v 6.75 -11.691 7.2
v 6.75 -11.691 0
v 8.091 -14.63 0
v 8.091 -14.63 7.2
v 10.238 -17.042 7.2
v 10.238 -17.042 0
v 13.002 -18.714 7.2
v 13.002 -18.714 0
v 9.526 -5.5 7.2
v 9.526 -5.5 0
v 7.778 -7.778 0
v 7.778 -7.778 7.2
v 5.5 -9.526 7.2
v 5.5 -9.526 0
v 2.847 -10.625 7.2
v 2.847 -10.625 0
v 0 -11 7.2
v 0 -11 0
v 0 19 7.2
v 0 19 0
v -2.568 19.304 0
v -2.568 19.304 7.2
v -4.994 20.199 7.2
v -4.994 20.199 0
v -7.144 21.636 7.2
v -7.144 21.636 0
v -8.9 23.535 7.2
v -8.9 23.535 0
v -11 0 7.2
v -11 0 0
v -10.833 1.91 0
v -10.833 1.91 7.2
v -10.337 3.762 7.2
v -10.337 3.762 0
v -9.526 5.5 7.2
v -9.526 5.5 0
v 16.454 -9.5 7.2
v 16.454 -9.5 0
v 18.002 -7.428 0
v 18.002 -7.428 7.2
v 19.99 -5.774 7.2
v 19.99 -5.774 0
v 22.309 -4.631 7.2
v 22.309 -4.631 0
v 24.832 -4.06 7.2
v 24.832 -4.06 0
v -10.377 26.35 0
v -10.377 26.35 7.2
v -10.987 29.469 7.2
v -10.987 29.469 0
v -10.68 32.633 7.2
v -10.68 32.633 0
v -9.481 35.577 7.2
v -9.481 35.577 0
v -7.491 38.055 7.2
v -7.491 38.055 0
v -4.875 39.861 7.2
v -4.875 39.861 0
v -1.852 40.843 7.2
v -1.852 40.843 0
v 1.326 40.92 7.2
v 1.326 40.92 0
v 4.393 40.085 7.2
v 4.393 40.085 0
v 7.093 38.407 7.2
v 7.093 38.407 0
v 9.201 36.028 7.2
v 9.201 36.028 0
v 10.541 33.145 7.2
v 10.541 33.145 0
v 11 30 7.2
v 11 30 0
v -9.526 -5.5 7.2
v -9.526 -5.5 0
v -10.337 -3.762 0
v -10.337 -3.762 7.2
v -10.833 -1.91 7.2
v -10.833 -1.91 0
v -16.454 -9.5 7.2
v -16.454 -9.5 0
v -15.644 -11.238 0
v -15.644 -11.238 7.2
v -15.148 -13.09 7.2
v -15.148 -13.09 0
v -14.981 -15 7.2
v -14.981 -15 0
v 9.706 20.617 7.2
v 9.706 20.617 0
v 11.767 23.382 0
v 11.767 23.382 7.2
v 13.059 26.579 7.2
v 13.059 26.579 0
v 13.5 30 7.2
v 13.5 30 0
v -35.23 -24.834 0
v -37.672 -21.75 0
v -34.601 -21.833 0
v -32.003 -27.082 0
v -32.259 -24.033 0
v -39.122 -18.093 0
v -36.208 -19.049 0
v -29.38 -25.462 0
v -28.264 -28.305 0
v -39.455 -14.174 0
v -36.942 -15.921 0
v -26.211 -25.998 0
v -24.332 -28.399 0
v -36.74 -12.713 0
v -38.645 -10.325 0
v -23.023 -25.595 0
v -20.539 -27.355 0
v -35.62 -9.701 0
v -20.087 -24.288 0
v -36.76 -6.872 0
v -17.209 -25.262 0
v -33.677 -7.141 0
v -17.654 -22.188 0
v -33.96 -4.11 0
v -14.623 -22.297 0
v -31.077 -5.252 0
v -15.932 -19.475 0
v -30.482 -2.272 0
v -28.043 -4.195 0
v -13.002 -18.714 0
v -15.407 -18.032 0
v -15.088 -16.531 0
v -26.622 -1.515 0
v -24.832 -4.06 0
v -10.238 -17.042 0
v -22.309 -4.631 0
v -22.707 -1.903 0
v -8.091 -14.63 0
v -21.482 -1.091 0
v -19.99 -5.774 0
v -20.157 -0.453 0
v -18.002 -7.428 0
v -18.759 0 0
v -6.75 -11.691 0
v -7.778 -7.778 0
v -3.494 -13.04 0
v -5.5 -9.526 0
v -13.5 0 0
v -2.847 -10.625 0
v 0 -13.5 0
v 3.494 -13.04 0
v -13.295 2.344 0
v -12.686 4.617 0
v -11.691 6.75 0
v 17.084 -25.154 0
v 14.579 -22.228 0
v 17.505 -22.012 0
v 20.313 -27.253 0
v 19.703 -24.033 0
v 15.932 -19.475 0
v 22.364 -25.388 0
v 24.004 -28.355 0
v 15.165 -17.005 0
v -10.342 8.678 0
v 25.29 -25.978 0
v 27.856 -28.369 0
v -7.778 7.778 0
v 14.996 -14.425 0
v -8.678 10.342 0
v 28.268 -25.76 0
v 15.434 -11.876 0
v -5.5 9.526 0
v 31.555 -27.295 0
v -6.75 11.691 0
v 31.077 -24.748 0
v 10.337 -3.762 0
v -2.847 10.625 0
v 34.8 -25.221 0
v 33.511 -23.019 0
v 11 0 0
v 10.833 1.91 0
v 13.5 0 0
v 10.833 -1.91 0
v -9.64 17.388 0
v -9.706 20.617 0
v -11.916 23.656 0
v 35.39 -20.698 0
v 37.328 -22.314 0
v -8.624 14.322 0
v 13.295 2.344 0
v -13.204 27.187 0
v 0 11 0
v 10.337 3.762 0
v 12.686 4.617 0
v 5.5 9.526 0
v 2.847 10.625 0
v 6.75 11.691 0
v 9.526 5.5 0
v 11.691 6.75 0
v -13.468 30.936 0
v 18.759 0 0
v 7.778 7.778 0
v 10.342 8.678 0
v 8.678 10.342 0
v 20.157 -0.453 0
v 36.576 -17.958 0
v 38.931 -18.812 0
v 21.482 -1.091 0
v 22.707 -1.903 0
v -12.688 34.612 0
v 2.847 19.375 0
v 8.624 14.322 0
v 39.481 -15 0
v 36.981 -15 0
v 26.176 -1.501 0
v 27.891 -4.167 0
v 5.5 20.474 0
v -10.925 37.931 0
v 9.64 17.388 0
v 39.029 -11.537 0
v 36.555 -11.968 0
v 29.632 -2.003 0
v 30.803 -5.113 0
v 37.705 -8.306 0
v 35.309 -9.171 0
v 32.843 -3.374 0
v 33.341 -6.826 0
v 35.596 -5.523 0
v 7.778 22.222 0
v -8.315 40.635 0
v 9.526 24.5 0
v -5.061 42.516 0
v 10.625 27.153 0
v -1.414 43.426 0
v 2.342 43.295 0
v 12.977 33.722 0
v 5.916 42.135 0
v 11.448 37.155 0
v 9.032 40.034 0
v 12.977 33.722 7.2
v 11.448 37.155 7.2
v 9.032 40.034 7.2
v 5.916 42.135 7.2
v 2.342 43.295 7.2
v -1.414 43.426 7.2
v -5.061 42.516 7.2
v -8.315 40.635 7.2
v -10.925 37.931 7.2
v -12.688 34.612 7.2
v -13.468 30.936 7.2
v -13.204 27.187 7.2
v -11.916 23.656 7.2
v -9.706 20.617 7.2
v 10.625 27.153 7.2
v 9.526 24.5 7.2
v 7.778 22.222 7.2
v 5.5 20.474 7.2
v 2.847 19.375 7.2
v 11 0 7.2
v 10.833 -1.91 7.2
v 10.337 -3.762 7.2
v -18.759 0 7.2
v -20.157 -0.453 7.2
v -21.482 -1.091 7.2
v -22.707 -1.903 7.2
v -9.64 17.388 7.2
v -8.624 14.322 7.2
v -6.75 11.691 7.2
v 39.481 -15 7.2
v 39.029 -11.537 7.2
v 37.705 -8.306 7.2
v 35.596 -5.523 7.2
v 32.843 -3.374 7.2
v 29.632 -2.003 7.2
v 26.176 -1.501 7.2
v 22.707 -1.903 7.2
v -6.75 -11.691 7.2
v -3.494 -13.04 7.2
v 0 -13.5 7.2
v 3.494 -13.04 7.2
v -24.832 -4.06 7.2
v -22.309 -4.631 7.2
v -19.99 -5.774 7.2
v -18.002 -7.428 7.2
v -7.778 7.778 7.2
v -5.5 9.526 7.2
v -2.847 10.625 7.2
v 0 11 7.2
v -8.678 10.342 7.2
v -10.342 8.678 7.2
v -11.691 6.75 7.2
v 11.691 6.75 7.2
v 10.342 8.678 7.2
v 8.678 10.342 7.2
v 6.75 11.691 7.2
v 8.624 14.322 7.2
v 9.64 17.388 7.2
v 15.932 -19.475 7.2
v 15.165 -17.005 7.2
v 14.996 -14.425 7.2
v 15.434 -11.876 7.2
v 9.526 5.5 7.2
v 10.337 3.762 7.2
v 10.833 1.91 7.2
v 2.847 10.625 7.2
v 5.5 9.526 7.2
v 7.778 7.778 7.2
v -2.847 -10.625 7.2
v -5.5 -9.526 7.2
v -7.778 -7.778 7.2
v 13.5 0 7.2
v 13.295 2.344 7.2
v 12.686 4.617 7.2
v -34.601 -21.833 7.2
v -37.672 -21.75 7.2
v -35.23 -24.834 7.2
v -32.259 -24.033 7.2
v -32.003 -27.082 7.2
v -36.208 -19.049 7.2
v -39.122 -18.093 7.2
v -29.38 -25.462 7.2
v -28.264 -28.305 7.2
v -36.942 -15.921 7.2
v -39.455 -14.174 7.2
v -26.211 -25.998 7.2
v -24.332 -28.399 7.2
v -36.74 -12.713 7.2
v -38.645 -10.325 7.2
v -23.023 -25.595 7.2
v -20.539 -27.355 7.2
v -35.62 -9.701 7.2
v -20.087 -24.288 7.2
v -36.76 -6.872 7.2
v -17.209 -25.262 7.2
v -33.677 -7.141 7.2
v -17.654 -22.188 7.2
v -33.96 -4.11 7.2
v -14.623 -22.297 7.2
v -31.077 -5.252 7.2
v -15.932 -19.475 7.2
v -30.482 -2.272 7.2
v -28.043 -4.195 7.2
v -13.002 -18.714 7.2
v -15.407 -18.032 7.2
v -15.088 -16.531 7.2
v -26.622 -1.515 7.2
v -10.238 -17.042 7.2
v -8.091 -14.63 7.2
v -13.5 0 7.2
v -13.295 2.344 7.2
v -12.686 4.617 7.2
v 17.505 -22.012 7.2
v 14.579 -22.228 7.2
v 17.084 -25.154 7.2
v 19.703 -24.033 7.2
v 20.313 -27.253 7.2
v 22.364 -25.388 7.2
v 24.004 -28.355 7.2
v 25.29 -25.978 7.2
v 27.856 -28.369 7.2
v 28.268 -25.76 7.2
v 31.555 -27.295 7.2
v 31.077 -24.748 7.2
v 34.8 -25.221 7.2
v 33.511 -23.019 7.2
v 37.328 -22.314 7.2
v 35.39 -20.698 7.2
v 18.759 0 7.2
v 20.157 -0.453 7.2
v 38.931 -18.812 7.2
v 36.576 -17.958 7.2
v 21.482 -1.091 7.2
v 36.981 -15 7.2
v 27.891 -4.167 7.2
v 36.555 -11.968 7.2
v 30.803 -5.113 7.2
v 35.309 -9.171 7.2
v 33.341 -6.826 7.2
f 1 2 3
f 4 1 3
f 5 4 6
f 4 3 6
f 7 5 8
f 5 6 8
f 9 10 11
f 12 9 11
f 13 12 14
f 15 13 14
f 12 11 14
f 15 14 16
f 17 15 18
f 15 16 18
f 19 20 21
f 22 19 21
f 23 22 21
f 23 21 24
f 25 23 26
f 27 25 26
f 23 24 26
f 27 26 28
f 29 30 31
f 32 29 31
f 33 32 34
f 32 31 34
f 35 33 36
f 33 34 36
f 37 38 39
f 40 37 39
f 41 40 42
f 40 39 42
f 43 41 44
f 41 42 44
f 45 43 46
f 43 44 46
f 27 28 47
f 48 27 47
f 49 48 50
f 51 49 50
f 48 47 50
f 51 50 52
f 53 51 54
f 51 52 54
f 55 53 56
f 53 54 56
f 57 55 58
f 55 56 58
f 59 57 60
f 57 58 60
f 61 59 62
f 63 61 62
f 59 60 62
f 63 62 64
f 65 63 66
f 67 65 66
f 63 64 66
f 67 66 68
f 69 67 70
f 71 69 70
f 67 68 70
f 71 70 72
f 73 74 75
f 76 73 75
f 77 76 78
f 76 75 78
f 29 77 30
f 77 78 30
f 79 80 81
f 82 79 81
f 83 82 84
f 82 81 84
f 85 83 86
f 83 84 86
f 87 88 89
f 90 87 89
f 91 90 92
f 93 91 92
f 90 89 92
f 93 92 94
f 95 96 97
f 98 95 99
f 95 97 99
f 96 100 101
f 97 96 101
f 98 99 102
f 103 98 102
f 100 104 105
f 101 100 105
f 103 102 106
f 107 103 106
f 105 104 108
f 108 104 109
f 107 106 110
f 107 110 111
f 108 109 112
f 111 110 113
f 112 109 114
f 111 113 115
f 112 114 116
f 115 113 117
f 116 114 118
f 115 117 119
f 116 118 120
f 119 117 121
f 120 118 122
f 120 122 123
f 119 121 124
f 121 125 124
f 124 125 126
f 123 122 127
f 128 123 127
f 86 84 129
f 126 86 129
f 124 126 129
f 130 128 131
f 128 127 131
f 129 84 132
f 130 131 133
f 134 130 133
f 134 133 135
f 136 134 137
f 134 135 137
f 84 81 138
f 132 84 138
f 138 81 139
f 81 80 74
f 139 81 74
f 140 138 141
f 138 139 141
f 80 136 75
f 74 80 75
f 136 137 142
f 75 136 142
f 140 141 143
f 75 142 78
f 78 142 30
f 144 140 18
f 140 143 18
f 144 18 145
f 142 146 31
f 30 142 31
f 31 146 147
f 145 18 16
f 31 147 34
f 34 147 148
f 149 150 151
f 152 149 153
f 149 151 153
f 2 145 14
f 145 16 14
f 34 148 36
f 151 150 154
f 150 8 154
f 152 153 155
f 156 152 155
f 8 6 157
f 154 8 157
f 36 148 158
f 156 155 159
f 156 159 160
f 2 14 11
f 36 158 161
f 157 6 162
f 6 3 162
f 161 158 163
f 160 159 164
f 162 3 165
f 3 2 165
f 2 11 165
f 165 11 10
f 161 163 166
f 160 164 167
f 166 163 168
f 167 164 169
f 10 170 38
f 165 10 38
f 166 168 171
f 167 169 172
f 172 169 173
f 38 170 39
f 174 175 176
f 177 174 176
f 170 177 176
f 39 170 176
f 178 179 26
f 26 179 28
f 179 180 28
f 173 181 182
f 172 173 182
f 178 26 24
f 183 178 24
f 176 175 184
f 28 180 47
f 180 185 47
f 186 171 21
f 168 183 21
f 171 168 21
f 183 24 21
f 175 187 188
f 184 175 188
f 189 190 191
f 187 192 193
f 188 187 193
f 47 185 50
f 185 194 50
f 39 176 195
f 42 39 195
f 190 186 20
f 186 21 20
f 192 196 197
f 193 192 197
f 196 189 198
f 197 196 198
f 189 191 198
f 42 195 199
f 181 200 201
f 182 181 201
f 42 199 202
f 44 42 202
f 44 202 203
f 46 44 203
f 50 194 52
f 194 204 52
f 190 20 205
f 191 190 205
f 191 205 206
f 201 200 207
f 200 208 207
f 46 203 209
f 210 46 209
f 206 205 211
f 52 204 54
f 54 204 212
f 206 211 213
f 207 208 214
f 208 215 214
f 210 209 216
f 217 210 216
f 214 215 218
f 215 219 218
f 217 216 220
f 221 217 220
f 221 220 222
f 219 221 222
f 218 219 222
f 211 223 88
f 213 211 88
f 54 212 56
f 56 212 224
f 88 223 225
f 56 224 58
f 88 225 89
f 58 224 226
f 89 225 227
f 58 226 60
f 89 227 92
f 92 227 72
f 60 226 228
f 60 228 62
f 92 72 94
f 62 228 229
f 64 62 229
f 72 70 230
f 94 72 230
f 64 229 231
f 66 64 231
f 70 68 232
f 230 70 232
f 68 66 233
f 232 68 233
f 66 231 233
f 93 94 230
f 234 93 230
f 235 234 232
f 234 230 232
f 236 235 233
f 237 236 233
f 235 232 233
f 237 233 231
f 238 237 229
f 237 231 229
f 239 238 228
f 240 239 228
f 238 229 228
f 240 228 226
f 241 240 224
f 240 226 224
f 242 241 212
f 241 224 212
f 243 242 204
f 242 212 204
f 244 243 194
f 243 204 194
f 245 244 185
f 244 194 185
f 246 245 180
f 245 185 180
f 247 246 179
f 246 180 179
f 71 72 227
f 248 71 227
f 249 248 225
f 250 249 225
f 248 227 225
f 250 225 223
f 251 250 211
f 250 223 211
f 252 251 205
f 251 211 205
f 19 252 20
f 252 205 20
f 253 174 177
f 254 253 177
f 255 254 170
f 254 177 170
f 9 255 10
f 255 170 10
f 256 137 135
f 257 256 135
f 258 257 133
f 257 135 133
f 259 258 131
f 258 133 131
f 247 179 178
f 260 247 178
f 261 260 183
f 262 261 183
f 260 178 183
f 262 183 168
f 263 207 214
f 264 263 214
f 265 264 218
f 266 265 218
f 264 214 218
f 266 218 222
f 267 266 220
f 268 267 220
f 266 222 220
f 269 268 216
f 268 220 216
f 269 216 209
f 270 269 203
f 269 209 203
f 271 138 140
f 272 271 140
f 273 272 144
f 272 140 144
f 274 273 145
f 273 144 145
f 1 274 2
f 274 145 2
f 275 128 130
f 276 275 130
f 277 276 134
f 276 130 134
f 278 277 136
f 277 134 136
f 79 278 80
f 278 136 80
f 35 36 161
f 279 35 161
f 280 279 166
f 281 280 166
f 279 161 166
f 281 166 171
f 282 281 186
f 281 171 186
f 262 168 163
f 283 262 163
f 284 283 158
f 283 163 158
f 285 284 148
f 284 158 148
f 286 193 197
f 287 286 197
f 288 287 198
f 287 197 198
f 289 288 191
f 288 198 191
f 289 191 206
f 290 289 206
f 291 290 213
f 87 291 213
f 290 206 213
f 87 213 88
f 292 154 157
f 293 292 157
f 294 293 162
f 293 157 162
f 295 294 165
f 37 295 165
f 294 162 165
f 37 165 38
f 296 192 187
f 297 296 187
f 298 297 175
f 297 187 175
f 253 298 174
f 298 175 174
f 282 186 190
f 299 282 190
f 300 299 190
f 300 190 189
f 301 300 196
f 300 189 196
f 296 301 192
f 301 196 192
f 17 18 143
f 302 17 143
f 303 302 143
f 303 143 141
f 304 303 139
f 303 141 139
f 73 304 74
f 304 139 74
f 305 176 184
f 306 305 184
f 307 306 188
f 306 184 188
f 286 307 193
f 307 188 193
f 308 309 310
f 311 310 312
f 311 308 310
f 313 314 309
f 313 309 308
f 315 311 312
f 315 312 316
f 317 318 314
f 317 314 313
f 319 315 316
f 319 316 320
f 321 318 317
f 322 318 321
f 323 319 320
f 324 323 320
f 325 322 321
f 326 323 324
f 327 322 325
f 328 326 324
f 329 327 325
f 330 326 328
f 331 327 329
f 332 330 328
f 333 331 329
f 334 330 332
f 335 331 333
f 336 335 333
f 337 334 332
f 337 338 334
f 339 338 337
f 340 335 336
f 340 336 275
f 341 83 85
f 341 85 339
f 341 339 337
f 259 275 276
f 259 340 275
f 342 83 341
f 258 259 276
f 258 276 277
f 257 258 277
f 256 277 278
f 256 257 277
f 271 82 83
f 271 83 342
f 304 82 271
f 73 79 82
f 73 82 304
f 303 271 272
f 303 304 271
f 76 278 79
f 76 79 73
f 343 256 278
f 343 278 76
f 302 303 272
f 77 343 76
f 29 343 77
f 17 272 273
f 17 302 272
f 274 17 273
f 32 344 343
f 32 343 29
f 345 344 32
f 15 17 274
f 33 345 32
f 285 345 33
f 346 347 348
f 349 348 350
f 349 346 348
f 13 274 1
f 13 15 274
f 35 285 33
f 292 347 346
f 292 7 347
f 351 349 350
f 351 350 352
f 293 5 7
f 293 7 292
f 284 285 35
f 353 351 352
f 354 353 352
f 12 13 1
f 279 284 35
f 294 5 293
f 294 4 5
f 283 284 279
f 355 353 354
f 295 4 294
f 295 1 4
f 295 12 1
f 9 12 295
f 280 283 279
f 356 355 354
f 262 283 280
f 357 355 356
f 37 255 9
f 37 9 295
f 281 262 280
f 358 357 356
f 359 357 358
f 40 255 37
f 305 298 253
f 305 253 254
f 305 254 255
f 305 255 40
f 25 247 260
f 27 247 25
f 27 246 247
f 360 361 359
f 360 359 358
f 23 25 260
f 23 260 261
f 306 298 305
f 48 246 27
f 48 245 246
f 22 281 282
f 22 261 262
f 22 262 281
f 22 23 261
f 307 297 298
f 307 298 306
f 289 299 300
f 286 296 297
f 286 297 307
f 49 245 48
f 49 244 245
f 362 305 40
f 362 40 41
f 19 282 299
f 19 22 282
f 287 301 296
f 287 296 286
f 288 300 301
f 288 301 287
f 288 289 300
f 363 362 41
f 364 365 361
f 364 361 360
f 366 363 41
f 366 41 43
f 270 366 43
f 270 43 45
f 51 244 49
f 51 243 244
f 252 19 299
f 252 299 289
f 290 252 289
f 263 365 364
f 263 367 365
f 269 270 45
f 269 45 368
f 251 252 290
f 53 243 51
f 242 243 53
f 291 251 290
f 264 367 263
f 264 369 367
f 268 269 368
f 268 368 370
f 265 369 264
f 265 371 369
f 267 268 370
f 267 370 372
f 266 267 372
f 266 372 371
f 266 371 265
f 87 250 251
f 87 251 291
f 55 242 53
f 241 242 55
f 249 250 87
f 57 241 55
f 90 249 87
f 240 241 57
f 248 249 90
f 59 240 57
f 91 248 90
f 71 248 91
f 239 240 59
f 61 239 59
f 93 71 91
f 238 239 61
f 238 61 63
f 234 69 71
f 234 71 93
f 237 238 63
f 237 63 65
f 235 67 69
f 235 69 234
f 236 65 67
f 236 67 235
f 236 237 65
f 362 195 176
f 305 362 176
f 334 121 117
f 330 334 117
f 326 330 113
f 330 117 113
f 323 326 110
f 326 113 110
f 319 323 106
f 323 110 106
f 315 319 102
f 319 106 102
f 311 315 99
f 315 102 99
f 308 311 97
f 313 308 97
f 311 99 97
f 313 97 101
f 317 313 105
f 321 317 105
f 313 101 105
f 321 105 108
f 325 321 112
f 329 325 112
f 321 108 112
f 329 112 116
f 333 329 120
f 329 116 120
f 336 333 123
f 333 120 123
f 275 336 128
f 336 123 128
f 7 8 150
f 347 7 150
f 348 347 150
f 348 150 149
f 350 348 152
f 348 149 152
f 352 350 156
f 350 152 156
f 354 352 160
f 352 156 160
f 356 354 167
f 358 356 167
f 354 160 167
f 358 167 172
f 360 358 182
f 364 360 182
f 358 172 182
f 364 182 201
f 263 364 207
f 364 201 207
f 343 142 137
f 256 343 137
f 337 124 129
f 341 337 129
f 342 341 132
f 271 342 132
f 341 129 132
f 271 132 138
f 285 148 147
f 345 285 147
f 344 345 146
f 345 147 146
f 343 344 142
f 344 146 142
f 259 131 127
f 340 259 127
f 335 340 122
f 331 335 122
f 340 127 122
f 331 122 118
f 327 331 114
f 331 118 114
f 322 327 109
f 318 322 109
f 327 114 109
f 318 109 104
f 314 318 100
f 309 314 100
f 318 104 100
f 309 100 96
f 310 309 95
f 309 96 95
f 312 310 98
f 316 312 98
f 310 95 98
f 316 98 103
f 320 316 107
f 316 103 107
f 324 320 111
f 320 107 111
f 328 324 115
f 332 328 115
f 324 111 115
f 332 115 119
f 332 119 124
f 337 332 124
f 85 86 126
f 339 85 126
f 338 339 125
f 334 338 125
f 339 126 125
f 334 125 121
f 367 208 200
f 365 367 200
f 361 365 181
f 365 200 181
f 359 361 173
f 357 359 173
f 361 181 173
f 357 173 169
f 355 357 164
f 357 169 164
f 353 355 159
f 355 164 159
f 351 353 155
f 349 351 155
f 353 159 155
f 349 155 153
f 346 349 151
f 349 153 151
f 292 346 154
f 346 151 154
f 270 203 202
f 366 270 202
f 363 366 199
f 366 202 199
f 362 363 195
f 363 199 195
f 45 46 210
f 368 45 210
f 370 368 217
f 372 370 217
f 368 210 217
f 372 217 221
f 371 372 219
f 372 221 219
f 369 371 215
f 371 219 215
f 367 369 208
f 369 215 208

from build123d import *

# Parameters (mm, degrees)
F1_DEPTH = 7.2


with BuildPart() as f1:
    # F0 (on Top) → F1 (new body)
    with BuildSketch(Plane.XY):
        with BuildLine():
            ThreePointArc((-22.7073595632, -1.902869179), (-37.6721050646, -21.75), (-13.0016128307, -18.7137156451))
            ThreePointArc((-13.0016128307, -18.7137156451), (-14.4400957969, -19.1971358452), (-15.9320338179, -19.4747133584))
            ThreePointArc((-15.9320338179, -19.4747133584), (-35.5070415552, -20.5), (-24.8316134088, -4.060189341))
            ThreePointArc((-24.8316134088, -4.060189341), (-23.8452552203, -2.9069218706), (-22.7073595632, -1.902869179))
        make_face()
        with BuildLine():
            ThreePointArc((-6.75, -11.6913429511), (-9.545941546, -9.545941546), (-11.6913429511, -6.75))
            Line((-11.6913429511, -6.75), (-14.2894191624, -8.25))
            ThreePointArc((-14.2894191624, -8.25), (-12.9407634586, -11.5059428911), (-12.4807621135, -15))
            ThreePointArc((-12.4807621135, -15), (-12.6116088995, -16.8750312906), (-13.0016128307, -18.7137156451))
            ThreePointArc((-13.0016128307, -18.7137156451), (-9.0739087263, -15.9164124969), (-6.75, -11.6913429511))
        make_face()
        with BuildLine():
            Line((-14.2894191624, -8.25), (-11.6913429511, -6.75))
            ThreePointArc((-11.6913429511, -6.75), (-13.0399986549, -3.4940571089), (-13.5, 0))
            Line((-13.5, 0), (-18.7587036207, 0))
            ThreePointArc((-18.7587036207, 0), (-20.8303192969, -0.7495522538), (-22.7073595632, -1.902869179))
            ThreePointArc((-22.7073595632, -1.902869179), (-17.8531905577, -4.2207337632), (-14.2894191624, -8.25))
        make_face()
        with BuildLine():
            Line((-16.4544826719, -9.5), (-14.2894191624, -8.25))
            ThreePointArc((-14.2894191624, -8.25), (-17.8531905577, -4.2207337632), (-22.7073595632, -1.902869179))
            ThreePointArc((-22.7073595632, -1.902869179), (-23.8452552203, -2.9069218706), (-24.8316134088, -4.060189341))
            ThreePointArc((-24.8316134088, -4.060189341), (-19.9900128675, -5.7744418342), (-16.4544826719, -9.5))
        make_face()
        with BuildLine():
            ThreePointArc((-12.4807621135, -15), (-12.9407634586, -11.5059428911), (-14.2894191624, -8.25))
            Line((-14.2894191624, -8.25), (-16.4544826719, -9.5))
            ThreePointArc((-16.4544826719, -9.5), (-15.3555780244, -12.1529905039), (-14.9807621135, -15))
            ThreePointArc((-14.9807621135, -15), (-15.221207958, -17.2873553231), (-15.9320338179, -19.4747133584))
            ThreePointArc((-15.9320338179, -19.4747133584), (-14.4400957969, -19.1971358452), (-13.0016128307, -18.7137156451))
            ThreePointArc((-13.0016128307, -18.7137156451), (-12.6116088995, -16.8750312906), (-12.4807621135, -15))
        make_face()
        with BuildLine():
            Line((16.4544826719, -9.5), (14.2894191624, -8.25))
            ThreePointArc((14.2894191624, -8.25), (12.5818579404, -13.35094968), (13.0016128307, -18.7137156451))
            ThreePointArc((13.0016128307, -18.7137156451), (14.4400957969, -19.1971358452), (15.9320338179, -19.4747133584))
            ThreePointArc((15.9320338179, -19.4747133584), (14.9958197548, -14.4246380482), (16.4544826719, -9.5))
        make_face()
        with BuildLine():
            Line((14.2894191624, -8.25), (11.6913429511, -6.75))
            ThreePointArc((11.6913429511, -6.75), (9.545941546, -9.545941546), (6.75, -11.6913429511))
            ThreePointArc((6.75, -11.6913429511), (9.0739087263, -15.9164124969), (13.0016128307, -18.7137156451))
            ThreePointArc((13.0016128307, -18.7137156451), (12.5818579404, -13.35094968), (14.2894191624, -8.25))
        make_face()
        with BuildLine():
            Line((18.7587036207, 0), (13.5, 0))
            ThreePointArc((13.5, 0), (13.0399986549, -3.4940571089), (11.6913429511, -6.75))
            Line((11.6913429511, -6.75), (14.2894191624, -8.25))
            ThreePointArc((14.2894191624, -8.25), (17.8531905577, -4.2207337632), (22.7073595632, -1.902869179))
            ThreePointArc((22.7073595632, -1.902869179), (20.8303192969, -0.7495522538), (18.7587036207, 0))
        make_face()
        with BuildLine():
            ThreePointArc((39.4807621135, -15), (34.2891634511, -4.3594893349), (22.7073595632, -1.902869179))
            ThreePointArc((22.7073595632, -1.902869179), (23.8452552203, -2.9069218706), (24.8316134088, -4.060189341))
            ThreePointArc((24.8316134088, -4.060189341), (33.3414470086, -6.8256304294), (36.9807621135, -15))
            ThreePointArc((36.9807621135, -15), (28.2681174366, -25.7595541555), (15.9320338179, -19.4747133584))
            ThreePointArc((15.9320338179, -19.4747133584), (14.4400957969, -19.1971358452), (13.0016128307, -18.7137156451))
            ThreePointArc((13.0016128307, -18.7137156451), (27.8557934041, -28.369153214), (39.4807621135, -15))
        make_face()
        with BuildLine():
            ThreePointArc((22.7073595632, -1.902869179), (17.8531905577, -4.2207337632), (14.2894191624, -8.25))
            Line((14.2894191624, -8.25), (16.4544826719, -9.5))
            ThreePointArc((16.4544826719, -9.5), (19.9900128675, -5.7744418342), (24.8316134088, -4.060189341))
            ThreePointArc((24.8316134088, -4.060189341), (23.8452552203, -2.9069218706), (22.7073595632, -1.902869179))
        make_face()
        with BuildLine():
            ThreePointArc((0, 11), (5.5, 9.5262794416), (9.5262794416, 5.5))
            Line((9.5262794416, 5.5), (11.6913429511, 6.75))
            ThreePointArc((11.6913429511, 6.75), (9.545941546, 9.545941546), (6.75, 11.6913429511))
            ThreePointArc((6.75, 11.6913429511), (3.4940571089, 13.0399986549), (0, 13.5))
            Line((0, 13.5), (0, 11))
        make_face()
        with BuildLine():
            ThreePointArc((9.5262794416, 5.5), (10.6251840892, 2.8470094961), (11, 0))
            Line((11, 0), (13.5, 0))
            ThreePointArc((13.5, 0), (13.0399986549, 3.4940571089), (11.6913429511, 6.75))
            Line((11.6913429511, 6.75), (9.5262794416, 5.5))
        make_face()
        with BuildLine():
            Line((13.5, 0), (11, 0))
            ThreePointArc((11, 0), (10.6251840892, -2.8470094961), (9.5262794416, -5.5))
            Line((9.5262794416, -5.5), (11.6913429511, -6.75))
            ThreePointArc((11.6913429511, -6.75), (13.0399986549, -3.4940571089), (13.5, 0))
        make_face()
        with BuildLine():
            Line((11.6913429511, -6.75), (9.5262794416, -5.5))
            ThreePointArc((9.5262794416, -5.5), (5.5, -9.5262794416), (0, -11))
            Line((0, -11), (0, -13.5))
            ThreePointArc((0, -13.5), (3.4940571089, -13.0399986549), (6.75, -11.6913429511))
            ThreePointArc((6.75, -11.6913429511), (9.545941546, -9.545941546), (11.6913429511, -6.75))
        make_face()
        with BuildLine():
            Line((0, -13.5), (0, -11))
            ThreePointArc((0, -11), (-5.5, -9.5262794416), (-9.5262794416, -5.5))
            Line((-9.5262794416, -5.5), (-11.6913429511, -6.75))
            ThreePointArc((-11.6913429511, -6.75), (-9.545941546, -9.545941546), (-6.75, -11.6913429511))
            ThreePointArc((-6.75, -11.6913429511), (-3.4940571089, -13.0399986549), (0, -13.5))
        make_face()
        with BuildLine():
            Line((-11.6913429511, -6.75), (-9.5262794416, -5.5))
            ThreePointArc((-9.5262794416, -5.5), (-10.6251840892, -2.8470094961), (-11, 0))
            Line((-11, 0), (-13.5, 0))
            ThreePointArc((-13.5, 0), (-13.0399986549, -3.4940571089), (-11.6913429511, -6.75))
        make_face()
        with BuildLine():
            Line((-13.5, 0), (-11, 0))
            ThreePointArc((-11, 0), (-10.6251840892, 2.8470094961), (-9.5262794416, 5.5))
            Line((-9.5262794416, 5.5), (-11.6913429511, 6.75))
            ThreePointArc((-11.6913429511, 6.75), (-13.0399986549, 3.4940571089), (-13.5, 0))
        make_face()
        with BuildLine():
            ThreePointArc((-9.5262794416, 5.5), (-5.5, 9.5262794416), (0, 11))
            Line((0, 11), (0, 13.5))
            ThreePointArc((0, 13.5), (-3.4940571089, 13.0399986549), (-6.75, 11.6913429511))
            ThreePointArc((-6.75, 11.6913429511), (-9.545941546, 9.545941546), (-11.6913429511, 6.75))
            Line((-11.6913429511, 6.75), (-9.5262794416, 5.5))
        make_face()
        with BuildLine():
            ThreePointArc((-6.75, 11.6913429511), (-3.4940571089, 13.0399986549), (0, 13.5))
            Line((0, 13.5), (0, 16.5))
            ThreePointArc((0, 16.5), (-5.2713326173, 17.5716834431), (-9.7057467326, 20.6165848241))
            ThreePointArc((-9.7057467326, 20.6165848241), (-9.2470631962, 15.816441717), (-6.75, 11.6913429511))
        make_face()
        with BuildLine():
            Line((0, 16.5), (0, 13.5))
            ThreePointArc((0, 13.5), (3.4940571089, 13.0399986549), (6.75, 11.6913429511))
            ThreePointArc((6.75, 11.6913429511), (9.2470631962, 15.816441717), (9.7057467326, 20.6165848241))
            ThreePointArc((9.7057467326, 20.6165848241), (5.2713326173, 17.5716834431), (0, 16.5))
        make_face()
        with BuildLine():
            Line((0, 19), (0, 16.5))
            ThreePointArc((0, 16.5), (5.2713326173, 17.5716834431), (9.7057467326, 20.6165848241))
            ThreePointArc((9.7057467326, 20.6165848241), (9.4051594234, 22.1040577159), (8.8995795909, 23.5349026995))
            ThreePointArc((8.8995795909, 23.5349026995), (4.9941931127, 20.1990798823), (0, 19))
        make_face()
        with BuildLine():
            ThreePointArc((-9.7057467326, 20.6165848241), (-5.2713326173, 17.5716834431), (0, 16.5))
            Line((0, 16.5), (0, 19))
            ThreePointArc((0, 19), (-4.9941931127, 20.1990798823), (-8.8995795909, 23.5349026995))
            ThreePointArc((-8.8995795909, 23.5349026995), (-9.4051594234, 22.1040577159), (-9.7057467326, 20.6165848241))
        make_face()
        with BuildLine():
            ThreePointArc((8.8995795909, 23.5349026995), (9.4051594234, 22.1040577159), (9.7057467326, 20.6165848241))
            ThreePointArc((9.7057467326, 20.6165848241), (12.5155419557, 24.9392481235), (13.5, 30))
            ThreePointArc((13.5, 30), (-5.0607518765, 42.5155419557), (-9.7057467326, 20.6165848241))
            ThreePointArc((-9.7057467326, 20.6165848241), (-9.4051594234, 22.1040577159), (-8.8995795909, 23.5349026995))
            ThreePointArc((-8.8995795909, 23.5349026995), (-3.3988692605, 40.4617248936), (11, 30))
            ThreePointArc((11, 30), (10.4617248936, 26.6011307395), (8.8995795909, 23.5349026995))
        make_face()
    extrude(amount=F1_DEPTH)


solid = f1.part
